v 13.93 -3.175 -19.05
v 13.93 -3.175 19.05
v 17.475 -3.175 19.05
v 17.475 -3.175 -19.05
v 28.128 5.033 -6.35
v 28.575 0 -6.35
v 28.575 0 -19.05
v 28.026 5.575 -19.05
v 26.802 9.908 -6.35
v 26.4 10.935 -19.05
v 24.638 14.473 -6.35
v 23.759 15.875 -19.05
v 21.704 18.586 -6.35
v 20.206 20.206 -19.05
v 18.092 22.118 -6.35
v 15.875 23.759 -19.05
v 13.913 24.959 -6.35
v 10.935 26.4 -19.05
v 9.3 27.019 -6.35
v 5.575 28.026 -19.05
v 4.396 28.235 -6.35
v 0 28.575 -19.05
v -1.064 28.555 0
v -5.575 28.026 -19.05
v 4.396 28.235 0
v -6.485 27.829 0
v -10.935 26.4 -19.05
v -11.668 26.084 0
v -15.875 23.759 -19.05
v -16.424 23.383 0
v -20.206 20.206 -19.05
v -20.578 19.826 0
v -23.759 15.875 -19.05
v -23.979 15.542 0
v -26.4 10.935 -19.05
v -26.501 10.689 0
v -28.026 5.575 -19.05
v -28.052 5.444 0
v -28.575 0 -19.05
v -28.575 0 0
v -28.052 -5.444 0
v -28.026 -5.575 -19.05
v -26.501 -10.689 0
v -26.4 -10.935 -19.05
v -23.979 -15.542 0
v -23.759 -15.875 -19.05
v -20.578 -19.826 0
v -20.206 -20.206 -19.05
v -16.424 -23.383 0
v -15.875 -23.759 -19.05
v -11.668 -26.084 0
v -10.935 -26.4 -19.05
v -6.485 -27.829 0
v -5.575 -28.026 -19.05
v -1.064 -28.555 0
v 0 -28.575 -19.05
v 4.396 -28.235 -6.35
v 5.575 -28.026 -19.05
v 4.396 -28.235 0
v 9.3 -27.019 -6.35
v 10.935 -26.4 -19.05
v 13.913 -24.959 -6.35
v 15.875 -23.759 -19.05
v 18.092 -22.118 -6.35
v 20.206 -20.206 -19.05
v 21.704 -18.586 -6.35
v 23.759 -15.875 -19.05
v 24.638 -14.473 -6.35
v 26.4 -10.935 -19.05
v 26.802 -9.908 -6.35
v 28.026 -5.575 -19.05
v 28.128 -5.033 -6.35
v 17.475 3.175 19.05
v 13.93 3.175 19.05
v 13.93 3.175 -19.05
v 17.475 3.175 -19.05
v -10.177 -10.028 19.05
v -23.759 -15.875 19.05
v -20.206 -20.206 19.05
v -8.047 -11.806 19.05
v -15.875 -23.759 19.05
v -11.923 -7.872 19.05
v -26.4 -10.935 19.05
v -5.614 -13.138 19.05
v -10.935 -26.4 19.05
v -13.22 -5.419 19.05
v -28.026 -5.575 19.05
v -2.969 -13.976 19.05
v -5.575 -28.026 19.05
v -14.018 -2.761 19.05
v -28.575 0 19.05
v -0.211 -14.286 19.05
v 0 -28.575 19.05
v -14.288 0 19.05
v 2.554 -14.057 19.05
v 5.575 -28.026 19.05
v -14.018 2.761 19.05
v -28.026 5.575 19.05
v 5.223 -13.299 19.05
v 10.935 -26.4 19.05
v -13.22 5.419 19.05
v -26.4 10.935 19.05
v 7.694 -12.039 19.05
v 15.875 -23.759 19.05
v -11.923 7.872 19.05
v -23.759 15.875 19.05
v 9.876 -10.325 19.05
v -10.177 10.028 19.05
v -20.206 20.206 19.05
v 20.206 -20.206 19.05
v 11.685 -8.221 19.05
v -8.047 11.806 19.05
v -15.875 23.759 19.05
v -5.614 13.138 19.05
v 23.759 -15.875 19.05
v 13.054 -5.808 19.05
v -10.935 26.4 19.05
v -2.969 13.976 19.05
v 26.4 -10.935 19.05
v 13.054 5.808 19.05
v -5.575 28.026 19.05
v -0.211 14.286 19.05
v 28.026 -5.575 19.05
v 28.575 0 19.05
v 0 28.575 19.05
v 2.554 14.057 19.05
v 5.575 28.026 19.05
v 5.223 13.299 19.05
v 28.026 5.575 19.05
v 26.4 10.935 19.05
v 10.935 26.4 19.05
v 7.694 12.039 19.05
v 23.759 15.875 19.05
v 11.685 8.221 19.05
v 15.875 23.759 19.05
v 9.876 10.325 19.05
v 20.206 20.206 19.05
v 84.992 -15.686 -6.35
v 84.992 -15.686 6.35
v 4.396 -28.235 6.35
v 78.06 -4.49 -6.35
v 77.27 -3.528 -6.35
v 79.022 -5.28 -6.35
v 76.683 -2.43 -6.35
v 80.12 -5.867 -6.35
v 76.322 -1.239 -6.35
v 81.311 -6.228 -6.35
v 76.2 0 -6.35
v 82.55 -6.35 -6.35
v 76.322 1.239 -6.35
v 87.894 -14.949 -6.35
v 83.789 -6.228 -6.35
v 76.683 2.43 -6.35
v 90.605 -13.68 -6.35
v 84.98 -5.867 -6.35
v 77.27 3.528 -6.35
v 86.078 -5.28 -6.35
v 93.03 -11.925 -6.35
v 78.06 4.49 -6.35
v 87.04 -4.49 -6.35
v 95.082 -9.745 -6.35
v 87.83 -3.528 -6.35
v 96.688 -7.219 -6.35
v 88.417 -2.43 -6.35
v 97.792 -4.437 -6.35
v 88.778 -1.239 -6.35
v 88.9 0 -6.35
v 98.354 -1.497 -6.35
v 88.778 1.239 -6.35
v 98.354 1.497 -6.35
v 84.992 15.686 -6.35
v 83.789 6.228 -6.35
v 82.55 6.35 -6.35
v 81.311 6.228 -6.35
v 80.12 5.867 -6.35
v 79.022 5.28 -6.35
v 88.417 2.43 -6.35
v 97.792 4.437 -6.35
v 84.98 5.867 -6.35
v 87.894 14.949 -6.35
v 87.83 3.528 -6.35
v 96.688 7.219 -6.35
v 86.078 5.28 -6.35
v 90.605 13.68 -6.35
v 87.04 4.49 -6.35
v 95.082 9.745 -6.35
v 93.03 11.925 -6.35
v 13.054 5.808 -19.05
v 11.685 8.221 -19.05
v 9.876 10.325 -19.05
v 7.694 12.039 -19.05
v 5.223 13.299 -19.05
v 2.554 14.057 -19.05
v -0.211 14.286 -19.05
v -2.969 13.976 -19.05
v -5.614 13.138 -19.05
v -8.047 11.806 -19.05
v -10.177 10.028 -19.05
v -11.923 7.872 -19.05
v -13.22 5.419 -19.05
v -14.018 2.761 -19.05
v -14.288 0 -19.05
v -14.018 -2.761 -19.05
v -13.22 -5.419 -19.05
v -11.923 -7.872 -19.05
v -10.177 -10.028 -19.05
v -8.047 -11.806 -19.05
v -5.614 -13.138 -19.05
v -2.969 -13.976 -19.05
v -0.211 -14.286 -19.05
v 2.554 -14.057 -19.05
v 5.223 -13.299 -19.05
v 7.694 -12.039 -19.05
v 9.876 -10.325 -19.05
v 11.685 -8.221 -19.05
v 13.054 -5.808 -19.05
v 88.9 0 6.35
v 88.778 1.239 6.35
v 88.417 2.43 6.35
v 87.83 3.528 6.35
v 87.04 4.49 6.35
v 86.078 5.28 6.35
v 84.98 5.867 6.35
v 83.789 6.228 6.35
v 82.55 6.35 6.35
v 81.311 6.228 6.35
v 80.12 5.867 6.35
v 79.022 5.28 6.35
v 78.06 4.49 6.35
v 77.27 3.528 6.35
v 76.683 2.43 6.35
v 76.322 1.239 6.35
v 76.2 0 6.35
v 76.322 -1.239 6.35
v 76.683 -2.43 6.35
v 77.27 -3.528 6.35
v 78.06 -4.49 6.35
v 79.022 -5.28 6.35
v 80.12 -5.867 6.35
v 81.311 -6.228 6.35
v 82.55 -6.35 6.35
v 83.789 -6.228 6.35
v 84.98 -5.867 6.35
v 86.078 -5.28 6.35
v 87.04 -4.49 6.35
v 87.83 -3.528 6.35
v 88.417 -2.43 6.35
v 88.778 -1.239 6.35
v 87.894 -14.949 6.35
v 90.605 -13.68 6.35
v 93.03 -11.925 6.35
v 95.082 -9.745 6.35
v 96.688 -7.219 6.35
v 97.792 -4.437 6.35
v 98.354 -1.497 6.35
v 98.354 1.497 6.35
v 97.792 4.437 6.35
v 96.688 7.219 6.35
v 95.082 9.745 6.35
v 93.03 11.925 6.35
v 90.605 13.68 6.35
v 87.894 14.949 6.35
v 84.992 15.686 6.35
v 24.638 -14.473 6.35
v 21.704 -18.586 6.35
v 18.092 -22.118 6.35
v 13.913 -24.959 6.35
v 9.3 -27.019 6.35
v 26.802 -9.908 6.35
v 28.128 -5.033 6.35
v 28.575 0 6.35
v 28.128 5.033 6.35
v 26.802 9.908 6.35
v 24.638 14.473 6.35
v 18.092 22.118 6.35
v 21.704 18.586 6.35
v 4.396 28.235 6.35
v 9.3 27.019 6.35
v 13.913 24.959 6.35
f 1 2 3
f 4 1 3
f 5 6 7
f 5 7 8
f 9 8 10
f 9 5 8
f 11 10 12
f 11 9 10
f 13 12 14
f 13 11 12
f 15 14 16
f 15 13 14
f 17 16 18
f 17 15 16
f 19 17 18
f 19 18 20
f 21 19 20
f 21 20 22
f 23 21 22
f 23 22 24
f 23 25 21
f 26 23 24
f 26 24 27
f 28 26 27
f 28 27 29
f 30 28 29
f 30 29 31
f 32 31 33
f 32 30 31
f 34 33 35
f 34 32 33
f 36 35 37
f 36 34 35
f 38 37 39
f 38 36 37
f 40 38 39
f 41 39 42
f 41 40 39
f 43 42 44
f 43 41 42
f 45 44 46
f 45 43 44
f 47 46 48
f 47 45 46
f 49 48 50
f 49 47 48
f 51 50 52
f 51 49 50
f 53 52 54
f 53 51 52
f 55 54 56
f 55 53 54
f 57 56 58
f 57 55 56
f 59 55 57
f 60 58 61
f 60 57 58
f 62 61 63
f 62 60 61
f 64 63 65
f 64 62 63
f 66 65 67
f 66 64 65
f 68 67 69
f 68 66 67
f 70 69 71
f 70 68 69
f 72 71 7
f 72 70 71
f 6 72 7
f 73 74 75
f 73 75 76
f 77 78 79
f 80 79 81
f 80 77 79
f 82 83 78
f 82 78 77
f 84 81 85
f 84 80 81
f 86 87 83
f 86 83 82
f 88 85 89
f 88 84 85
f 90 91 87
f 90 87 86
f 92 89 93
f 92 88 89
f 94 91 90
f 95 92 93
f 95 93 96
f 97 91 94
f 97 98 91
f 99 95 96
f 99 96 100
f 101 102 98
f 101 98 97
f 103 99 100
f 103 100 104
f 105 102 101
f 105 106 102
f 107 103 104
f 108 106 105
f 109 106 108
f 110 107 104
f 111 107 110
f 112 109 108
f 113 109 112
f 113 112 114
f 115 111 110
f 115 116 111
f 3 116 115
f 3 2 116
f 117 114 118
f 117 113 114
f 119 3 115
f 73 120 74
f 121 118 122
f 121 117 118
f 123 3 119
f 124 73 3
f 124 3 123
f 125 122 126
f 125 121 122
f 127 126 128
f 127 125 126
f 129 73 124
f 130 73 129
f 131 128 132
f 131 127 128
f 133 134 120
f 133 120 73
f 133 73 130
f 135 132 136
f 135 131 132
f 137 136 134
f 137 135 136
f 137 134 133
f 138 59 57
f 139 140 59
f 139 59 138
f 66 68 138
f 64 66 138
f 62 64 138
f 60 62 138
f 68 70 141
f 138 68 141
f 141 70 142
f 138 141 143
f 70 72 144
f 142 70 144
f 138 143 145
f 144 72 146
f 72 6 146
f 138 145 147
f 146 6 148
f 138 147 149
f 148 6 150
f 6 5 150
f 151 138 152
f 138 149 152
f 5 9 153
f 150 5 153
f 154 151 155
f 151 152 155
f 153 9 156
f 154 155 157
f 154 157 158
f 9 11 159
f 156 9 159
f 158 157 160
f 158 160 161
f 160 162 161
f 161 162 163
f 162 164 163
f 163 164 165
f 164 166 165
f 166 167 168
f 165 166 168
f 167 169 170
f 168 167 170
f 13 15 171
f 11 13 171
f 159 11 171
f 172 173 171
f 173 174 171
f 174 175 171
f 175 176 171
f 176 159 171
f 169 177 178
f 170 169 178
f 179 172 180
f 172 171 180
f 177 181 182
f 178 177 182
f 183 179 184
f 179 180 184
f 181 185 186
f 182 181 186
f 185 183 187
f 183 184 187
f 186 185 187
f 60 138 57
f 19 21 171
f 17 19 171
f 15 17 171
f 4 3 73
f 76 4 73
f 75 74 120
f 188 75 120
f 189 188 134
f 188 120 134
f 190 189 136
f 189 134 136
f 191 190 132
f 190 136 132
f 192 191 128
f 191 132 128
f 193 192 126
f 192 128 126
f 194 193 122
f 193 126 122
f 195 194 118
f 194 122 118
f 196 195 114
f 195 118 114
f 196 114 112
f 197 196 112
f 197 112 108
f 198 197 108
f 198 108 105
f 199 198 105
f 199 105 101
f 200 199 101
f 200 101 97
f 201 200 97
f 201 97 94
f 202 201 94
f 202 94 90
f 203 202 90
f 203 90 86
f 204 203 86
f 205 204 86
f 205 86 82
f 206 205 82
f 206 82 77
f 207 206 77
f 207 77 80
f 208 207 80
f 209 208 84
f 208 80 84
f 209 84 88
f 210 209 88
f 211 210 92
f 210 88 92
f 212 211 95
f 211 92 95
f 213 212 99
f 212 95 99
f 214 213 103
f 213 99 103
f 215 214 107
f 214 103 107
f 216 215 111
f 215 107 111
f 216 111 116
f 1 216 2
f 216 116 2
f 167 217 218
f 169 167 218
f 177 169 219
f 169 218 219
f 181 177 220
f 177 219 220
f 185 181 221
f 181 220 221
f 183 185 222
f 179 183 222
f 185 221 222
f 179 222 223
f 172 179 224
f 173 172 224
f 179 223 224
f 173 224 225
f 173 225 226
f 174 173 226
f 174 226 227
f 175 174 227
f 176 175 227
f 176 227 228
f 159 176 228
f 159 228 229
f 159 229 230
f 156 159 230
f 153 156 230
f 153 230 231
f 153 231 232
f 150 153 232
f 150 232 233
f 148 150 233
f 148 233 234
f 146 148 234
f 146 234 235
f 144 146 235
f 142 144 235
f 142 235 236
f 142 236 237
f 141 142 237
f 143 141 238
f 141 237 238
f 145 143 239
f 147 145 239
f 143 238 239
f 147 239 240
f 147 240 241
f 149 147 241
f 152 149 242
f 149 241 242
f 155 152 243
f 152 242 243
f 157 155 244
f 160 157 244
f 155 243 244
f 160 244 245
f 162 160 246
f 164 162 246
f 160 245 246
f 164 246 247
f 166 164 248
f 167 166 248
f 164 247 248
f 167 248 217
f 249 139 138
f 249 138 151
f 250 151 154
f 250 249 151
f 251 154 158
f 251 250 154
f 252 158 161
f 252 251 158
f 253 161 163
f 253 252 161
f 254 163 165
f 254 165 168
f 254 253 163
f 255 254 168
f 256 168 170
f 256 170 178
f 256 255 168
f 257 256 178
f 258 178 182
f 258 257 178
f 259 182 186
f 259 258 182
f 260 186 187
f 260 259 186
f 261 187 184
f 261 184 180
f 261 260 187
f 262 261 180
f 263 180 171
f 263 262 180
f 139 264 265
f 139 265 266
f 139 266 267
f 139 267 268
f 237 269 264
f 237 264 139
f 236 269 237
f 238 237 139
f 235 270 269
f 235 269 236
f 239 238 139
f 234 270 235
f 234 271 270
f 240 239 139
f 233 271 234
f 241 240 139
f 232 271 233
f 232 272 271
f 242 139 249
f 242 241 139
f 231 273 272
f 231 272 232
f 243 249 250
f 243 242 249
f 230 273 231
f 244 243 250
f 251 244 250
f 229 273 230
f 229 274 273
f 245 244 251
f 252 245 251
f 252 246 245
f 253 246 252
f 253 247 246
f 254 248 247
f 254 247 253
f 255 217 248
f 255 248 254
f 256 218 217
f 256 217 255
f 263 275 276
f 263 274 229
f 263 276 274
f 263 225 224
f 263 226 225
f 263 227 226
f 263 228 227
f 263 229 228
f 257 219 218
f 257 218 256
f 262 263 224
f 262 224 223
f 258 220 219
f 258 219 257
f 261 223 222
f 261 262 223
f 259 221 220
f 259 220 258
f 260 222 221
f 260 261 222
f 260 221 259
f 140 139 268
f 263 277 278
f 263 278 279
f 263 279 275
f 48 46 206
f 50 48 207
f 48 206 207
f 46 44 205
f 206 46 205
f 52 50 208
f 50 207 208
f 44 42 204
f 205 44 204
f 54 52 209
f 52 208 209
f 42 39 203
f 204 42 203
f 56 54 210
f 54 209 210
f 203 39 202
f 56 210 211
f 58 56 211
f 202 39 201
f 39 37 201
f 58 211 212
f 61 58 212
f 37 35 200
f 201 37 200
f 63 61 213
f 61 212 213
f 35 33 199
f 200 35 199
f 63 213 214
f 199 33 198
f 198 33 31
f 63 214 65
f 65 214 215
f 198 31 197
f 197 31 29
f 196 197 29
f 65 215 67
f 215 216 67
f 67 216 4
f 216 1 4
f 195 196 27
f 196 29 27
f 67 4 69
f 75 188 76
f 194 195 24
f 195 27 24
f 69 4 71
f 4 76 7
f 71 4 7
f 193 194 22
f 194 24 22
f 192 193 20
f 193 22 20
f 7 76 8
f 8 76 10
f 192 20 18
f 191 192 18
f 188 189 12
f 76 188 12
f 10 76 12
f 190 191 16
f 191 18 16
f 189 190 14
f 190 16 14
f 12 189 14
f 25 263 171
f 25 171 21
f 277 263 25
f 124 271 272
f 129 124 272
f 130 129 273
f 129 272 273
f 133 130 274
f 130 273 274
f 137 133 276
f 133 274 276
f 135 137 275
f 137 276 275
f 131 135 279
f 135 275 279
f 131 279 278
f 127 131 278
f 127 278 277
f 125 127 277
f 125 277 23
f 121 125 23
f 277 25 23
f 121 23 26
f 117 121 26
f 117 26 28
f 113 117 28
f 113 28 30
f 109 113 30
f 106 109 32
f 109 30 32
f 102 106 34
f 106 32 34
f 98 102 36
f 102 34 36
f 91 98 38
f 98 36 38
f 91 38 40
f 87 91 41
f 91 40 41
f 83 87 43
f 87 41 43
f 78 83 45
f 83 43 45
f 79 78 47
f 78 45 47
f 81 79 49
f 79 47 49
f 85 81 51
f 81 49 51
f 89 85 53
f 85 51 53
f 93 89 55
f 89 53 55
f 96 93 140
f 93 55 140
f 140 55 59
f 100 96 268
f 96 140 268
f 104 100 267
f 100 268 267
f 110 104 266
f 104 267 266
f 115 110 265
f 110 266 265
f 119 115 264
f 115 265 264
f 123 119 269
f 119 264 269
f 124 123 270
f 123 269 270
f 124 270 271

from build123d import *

# Parameters (mm, degrees)
BOSS_EXTRUDE3_DEPTH      = 6.35
BOSS_EXTRUDE3_DEPTH_BACK = 6.35
BOSS_EXTRUDE4_DEPTH      = 19.05
BOSS_EXTRUDE4_DEPTH_BACK = 19.05
SKETCH3_R                = 28.575
SKETCH4_R                = 6.35
CUT_EXTRUDE1_DEPTH       = 106.589636092
SKETCH5_R                = 14.2875
CUT_EXTRUDE2_DEPTH       = 110.341763522
SKETCH6_W                = 17.4752
SKETCH6_H                = 6.35
CUT_EXTRUDE3_DEPTH       = 110.341763522


with BuildPart() as part:
    # Sketch1 → Boss-Extrude3 (new, two sides: drawn at the far end of the back side and taken through both)
    with BuildSketch(Plane.XY.offset(-BOSS_EXTRUDE3_DEPTH_BACK)):
        with BuildLine():
            Line((4.396153846, -28.234809303), (84.992307692, -15.686005168))
            ThreePointArc((84.992307692, -15.686005168), (98.425, 0), (84.992307692, 15.686005168))
            Line((84.992307692, 15.686005168), (4.396153846, 28.234809303))
            ThreePointArc((4.396153846, 28.234809303), (28.575, 0), (4.396153846, -28.234809303))
        make_face()
    extrude(amount=BOSS_EXTRUDE3_DEPTH + BOSS_EXTRUDE3_DEPTH_BACK)

    # Sketch3 → Boss-Extrude4 (add, two sides: drawn at the far end of the back side and taken through both)
    with BuildSketch(Plane.XY.offset(-BOSS_EXTRUDE4_DEPTH_BACK)):
        Circle(SKETCH3_R)
    extrude(amount=BOSS_EXTRUDE4_DEPTH + BOSS_EXTRUDE4_DEPTH_BACK)

    # Sketch4 → Cut-Extrude1 (cut, through all)
    with BuildSketch(Plane.XY.offset(6.35)):
        with Locations((82.55, 0)):
            Circle(SKETCH4_R)
    extrude(amount=-CUT_EXTRUDE1_DEPTH, mode=Mode.SUBTRACT)

    # Sketch5 → Cut-Extrude2 (cut, through all)
    with BuildSketch(Plane.XY.offset(19.05)):
        Circle(SKETCH5_R)
    extrude(amount=-CUT_EXTRUDE2_DEPTH, mode=Mode.SUBTRACT)

    # Sketch6 → Cut-Extrude3 (cut, through all)
    with BuildSketch(Plane.XY.offset(19.05)):
        with Locations((8.7376, 0)):
            Rectangle(SKETCH6_W, SKETCH6_H)
    extrude(amount=-CUT_EXTRUDE3_DEPTH, mode=Mode.SUBTRACT)


solid = part.part
